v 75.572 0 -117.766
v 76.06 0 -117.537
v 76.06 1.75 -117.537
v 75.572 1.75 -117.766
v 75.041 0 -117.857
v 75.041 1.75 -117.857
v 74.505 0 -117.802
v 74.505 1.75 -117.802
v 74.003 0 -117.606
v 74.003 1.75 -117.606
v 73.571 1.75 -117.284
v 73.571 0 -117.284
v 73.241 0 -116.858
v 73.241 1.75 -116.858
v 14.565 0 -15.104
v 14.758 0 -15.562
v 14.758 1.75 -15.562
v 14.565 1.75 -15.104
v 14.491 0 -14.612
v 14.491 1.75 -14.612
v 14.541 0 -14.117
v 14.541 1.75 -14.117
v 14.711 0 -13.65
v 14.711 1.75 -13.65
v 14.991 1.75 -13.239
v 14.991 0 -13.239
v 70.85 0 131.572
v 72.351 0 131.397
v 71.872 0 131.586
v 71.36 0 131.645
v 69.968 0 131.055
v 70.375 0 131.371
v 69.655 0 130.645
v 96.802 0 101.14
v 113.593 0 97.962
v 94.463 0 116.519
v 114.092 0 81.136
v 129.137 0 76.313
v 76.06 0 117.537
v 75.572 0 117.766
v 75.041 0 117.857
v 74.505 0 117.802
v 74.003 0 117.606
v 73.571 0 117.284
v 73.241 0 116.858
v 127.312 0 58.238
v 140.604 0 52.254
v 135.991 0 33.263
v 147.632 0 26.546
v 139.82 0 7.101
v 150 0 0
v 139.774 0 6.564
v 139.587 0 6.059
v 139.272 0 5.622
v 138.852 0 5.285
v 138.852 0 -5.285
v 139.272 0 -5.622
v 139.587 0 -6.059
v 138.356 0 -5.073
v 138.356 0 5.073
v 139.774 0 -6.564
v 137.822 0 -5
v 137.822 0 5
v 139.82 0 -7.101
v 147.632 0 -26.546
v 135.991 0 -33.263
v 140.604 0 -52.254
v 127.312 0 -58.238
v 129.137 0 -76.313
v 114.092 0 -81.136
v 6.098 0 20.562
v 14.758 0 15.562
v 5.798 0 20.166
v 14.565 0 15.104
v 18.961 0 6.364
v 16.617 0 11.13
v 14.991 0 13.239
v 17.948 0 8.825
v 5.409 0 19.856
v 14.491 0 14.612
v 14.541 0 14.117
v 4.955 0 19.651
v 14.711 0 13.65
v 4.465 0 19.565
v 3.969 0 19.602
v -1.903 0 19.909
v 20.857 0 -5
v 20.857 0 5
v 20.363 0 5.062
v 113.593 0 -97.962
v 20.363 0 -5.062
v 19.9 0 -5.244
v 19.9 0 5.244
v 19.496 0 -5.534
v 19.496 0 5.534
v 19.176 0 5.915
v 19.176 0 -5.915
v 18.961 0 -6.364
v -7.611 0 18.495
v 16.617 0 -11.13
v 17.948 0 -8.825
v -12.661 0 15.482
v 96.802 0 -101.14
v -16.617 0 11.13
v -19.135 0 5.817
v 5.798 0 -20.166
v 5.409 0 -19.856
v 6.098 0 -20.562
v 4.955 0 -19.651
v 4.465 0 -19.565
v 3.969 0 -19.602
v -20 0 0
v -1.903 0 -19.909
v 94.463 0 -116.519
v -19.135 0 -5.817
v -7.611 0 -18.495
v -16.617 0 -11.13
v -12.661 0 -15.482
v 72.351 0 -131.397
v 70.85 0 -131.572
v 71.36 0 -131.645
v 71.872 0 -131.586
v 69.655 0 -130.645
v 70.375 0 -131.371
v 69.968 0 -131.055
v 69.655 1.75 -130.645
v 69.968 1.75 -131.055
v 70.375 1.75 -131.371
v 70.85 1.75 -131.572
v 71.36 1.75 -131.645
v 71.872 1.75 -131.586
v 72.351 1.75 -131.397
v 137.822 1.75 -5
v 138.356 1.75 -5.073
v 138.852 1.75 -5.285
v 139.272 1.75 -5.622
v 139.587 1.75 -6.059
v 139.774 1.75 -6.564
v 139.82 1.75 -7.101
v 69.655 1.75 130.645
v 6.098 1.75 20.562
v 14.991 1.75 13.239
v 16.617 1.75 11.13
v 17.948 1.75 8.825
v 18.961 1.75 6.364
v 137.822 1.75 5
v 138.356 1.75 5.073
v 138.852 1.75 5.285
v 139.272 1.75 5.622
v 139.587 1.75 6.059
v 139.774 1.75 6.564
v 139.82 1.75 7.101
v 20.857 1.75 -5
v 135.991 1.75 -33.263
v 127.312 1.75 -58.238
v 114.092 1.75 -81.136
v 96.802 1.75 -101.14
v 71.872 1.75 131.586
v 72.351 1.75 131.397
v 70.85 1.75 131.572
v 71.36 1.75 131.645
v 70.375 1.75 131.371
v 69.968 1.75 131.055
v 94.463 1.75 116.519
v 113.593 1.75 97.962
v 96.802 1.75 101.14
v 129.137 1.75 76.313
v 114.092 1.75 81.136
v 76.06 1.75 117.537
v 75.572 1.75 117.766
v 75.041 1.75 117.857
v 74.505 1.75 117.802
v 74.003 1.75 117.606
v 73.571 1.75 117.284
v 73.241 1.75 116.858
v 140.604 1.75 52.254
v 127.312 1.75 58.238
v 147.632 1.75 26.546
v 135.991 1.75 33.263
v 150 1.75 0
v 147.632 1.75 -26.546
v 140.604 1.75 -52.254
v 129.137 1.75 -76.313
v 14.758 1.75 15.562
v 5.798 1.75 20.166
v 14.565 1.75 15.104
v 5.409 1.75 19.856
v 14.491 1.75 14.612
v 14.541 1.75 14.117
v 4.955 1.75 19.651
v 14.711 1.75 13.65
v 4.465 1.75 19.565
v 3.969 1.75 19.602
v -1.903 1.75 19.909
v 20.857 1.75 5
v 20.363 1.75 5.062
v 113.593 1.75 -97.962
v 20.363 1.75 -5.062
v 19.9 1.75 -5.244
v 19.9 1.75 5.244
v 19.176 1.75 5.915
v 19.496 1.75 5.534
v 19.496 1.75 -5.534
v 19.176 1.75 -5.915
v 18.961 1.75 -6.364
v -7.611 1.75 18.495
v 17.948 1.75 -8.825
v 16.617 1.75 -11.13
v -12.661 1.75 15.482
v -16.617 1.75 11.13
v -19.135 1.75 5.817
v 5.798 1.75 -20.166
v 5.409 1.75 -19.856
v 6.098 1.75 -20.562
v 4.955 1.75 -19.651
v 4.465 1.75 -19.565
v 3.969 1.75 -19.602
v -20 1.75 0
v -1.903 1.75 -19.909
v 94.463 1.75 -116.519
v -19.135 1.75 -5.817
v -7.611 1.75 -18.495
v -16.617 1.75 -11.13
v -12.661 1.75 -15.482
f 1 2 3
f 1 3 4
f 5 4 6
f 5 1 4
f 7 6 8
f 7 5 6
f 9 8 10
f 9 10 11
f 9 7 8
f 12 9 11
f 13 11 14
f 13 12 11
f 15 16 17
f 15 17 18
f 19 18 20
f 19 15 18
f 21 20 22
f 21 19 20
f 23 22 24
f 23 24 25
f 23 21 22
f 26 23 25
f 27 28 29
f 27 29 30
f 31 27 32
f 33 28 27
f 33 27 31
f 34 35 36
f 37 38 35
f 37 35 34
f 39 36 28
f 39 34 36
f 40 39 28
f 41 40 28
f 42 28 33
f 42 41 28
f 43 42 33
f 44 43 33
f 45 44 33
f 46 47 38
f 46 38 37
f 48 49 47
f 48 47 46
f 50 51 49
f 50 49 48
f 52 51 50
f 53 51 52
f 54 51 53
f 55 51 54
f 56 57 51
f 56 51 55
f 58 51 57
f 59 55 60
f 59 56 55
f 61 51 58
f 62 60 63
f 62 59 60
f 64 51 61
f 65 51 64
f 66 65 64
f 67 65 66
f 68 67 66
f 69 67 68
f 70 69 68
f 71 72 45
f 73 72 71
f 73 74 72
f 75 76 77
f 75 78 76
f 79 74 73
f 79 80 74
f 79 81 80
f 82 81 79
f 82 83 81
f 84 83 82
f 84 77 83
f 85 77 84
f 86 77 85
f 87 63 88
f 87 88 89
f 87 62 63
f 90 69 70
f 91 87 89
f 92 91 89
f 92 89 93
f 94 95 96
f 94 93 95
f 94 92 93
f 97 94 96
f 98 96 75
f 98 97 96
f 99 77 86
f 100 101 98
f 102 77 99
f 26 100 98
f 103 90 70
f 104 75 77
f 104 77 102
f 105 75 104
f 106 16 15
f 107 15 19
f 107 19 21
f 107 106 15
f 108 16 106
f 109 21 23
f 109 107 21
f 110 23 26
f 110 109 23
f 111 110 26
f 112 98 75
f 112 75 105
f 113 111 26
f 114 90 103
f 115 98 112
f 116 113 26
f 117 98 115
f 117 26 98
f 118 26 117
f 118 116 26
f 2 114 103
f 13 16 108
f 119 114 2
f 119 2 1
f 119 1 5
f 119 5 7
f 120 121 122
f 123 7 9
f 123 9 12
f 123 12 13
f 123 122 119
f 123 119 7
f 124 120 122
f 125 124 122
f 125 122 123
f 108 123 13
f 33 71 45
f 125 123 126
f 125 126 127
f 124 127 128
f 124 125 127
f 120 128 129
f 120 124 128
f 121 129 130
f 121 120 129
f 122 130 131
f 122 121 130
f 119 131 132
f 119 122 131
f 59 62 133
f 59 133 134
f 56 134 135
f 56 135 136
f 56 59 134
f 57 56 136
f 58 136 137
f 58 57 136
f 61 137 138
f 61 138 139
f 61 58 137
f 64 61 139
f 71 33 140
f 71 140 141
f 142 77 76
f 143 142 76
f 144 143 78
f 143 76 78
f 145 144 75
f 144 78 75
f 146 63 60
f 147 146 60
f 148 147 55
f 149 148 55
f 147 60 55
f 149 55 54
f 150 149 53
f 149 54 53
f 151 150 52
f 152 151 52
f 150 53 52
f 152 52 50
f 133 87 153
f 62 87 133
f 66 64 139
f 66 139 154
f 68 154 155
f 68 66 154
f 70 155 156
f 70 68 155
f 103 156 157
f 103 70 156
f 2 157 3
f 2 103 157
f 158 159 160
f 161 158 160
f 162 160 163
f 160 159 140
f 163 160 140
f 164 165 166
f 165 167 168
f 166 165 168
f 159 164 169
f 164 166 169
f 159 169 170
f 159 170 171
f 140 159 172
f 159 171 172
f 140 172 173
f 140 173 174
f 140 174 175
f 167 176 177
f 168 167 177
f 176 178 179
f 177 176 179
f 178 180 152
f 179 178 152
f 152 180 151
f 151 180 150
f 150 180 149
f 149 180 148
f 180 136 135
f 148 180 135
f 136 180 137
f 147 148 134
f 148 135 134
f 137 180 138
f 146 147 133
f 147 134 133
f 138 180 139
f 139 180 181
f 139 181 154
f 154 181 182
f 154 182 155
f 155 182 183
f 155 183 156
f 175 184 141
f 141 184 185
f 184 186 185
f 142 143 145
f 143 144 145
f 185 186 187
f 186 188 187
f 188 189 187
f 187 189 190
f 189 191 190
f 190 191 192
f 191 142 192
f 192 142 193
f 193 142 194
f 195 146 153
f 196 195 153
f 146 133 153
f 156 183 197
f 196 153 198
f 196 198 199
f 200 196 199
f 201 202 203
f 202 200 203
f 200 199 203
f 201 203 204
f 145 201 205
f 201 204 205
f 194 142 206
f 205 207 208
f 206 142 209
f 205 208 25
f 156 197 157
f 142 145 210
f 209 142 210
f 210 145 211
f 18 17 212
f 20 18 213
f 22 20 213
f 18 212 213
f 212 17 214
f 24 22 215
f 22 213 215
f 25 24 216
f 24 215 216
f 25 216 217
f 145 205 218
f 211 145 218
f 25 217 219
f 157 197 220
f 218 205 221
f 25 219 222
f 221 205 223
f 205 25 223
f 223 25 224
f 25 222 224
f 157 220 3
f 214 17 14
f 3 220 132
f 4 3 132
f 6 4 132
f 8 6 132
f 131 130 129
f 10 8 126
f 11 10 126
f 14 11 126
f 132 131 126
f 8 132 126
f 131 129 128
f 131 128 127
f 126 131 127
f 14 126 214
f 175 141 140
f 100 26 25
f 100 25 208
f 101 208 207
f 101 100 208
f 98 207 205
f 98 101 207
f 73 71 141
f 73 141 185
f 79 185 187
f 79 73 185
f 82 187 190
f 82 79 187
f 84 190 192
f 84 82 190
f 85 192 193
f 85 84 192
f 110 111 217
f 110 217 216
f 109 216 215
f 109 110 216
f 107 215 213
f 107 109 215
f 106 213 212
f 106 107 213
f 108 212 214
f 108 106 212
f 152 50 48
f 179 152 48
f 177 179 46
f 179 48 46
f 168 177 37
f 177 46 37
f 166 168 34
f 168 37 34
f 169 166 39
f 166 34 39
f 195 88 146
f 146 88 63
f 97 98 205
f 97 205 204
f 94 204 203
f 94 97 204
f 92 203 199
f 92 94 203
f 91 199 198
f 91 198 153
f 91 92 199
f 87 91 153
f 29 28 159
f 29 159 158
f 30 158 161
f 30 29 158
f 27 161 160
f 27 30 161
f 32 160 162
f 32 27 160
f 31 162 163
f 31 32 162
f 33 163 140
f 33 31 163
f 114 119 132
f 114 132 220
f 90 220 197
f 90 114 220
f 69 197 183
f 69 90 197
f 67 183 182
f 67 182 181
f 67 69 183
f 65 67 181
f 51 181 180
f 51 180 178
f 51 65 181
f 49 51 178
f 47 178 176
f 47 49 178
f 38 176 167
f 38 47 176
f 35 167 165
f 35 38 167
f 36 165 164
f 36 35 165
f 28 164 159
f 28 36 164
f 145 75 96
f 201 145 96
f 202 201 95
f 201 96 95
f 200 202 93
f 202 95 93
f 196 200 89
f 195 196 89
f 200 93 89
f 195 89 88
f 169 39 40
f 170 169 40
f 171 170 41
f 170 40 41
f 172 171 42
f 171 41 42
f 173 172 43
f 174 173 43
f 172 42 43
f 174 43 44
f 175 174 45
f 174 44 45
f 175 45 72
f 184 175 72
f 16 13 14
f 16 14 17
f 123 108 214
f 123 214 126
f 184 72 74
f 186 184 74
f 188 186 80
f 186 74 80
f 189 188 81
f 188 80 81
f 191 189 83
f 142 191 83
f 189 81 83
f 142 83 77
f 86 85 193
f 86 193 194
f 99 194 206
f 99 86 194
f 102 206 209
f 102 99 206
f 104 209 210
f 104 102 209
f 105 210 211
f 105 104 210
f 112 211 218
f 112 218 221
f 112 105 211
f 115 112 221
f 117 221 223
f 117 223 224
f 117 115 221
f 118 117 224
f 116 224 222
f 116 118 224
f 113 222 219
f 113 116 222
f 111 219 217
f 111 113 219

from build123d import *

# Parameters (mm, degrees)
BOSS_EXTRUDE1_DEPTH = 1.75


with BuildPart() as part:
    # Sketch1 → Boss-Extrude1 (new body)
    with BuildSketch(Plane(origin=(0, 0, 0), x_dir=(1, 0, 0), z_dir=(0, 1, 0))):
        with BuildLine():
            Line((6.098199788, 20.562391868), (69.654668716, 130.645425201))
            ThreePointArc((69.654668716, 130.645425201), (70.84952744, 131.571931019), (72.351404923, 131.397390407))
            ThreePointArc((72.351404923, 131.397390407), (150, 0), (72.351404923, -131.397390407))
            ThreePointArc((72.351404923, -131.397390407), (70.84952744, -131.571931019), (69.654668716, -130.645425201))
            Line((69.654668716, -130.645425201), (6.098199788, -20.562391868))
            ThreePointArc((6.098199788, -20.562391868), (5.188430073, -19.739247934), (3.969226346, -19.602174426))
            ThreePointArc((3.969226346, -19.602174426), (-20, 0), (3.969226346, 19.602174426))
            ThreePointArc((3.969226346, 19.602174426), (5.188430073, 19.739247934), (6.098199788, 20.562391868))
        make_face()
        with BuildLine():
            Line((20.856653615, 5), (137.822349421, 5))
            ThreePointArc((137.822349421, 5), (139.271987057, 5.622120933), (139.819774775, 7.101449275))
            ThreePointArc((139.819774775, 7.101449275), (121.24355653, 70), (76.059922864, 117.536752269))
            ThreePointArc((76.059922864, 117.536752269), (74.504893079, 117.802018361), (73.24130173, 116.857655808))
            Line((73.24130173, 116.857655808), (14.758453826, 15.562391868))
            ThreePointArc((14.758453826, 15.562391868), (14.500475126, 14.362936215), (14.991367849, 13.238538062))
            ThreePointArc((14.991367849, 13.238538062), (17.320508076, 10), (18.960594195, 6.363636364))
            ThreePointArc((18.960594195, 6.363636364), (19.688905198, 5.376311718), (20.856653615, 5))
        make_face(mode=Mode.SUBTRACT)
        with BuildLine():
            Line((20.856653615, -5), (137.822349421, -5))
            ThreePointArc((137.822349421, -5), (139.271987057, -5.622120933), (139.819774775, -7.101449275))
            ThreePointArc((139.819774775, -7.101449275), (121.24355653, -70), (76.059922864, -117.536752269))
            ThreePointArc((76.059922864, -117.536752269), (74.504893079, -117.802018361), (73.24130173, -116.857655808))
            Line((73.24130173, -116.857655808), (14.758453826, -15.562391868))
            ThreePointArc((14.758453826, -15.562391868), (14.500475126, -14.362936215), (14.991367849, -13.238538062))
            ThreePointArc((14.991367849, -13.238538062), (17.320508076, -10), (18.960594195, -6.363636364))
            ThreePointArc((18.960594195, -6.363636364), (19.688905198, -5.376311718), (20.856653615, -5))
        make_face(mode=Mode.SUBTRACT)
    extrude(amount=BOSS_EXTRUDE1_DEPTH)


solid = part.part
